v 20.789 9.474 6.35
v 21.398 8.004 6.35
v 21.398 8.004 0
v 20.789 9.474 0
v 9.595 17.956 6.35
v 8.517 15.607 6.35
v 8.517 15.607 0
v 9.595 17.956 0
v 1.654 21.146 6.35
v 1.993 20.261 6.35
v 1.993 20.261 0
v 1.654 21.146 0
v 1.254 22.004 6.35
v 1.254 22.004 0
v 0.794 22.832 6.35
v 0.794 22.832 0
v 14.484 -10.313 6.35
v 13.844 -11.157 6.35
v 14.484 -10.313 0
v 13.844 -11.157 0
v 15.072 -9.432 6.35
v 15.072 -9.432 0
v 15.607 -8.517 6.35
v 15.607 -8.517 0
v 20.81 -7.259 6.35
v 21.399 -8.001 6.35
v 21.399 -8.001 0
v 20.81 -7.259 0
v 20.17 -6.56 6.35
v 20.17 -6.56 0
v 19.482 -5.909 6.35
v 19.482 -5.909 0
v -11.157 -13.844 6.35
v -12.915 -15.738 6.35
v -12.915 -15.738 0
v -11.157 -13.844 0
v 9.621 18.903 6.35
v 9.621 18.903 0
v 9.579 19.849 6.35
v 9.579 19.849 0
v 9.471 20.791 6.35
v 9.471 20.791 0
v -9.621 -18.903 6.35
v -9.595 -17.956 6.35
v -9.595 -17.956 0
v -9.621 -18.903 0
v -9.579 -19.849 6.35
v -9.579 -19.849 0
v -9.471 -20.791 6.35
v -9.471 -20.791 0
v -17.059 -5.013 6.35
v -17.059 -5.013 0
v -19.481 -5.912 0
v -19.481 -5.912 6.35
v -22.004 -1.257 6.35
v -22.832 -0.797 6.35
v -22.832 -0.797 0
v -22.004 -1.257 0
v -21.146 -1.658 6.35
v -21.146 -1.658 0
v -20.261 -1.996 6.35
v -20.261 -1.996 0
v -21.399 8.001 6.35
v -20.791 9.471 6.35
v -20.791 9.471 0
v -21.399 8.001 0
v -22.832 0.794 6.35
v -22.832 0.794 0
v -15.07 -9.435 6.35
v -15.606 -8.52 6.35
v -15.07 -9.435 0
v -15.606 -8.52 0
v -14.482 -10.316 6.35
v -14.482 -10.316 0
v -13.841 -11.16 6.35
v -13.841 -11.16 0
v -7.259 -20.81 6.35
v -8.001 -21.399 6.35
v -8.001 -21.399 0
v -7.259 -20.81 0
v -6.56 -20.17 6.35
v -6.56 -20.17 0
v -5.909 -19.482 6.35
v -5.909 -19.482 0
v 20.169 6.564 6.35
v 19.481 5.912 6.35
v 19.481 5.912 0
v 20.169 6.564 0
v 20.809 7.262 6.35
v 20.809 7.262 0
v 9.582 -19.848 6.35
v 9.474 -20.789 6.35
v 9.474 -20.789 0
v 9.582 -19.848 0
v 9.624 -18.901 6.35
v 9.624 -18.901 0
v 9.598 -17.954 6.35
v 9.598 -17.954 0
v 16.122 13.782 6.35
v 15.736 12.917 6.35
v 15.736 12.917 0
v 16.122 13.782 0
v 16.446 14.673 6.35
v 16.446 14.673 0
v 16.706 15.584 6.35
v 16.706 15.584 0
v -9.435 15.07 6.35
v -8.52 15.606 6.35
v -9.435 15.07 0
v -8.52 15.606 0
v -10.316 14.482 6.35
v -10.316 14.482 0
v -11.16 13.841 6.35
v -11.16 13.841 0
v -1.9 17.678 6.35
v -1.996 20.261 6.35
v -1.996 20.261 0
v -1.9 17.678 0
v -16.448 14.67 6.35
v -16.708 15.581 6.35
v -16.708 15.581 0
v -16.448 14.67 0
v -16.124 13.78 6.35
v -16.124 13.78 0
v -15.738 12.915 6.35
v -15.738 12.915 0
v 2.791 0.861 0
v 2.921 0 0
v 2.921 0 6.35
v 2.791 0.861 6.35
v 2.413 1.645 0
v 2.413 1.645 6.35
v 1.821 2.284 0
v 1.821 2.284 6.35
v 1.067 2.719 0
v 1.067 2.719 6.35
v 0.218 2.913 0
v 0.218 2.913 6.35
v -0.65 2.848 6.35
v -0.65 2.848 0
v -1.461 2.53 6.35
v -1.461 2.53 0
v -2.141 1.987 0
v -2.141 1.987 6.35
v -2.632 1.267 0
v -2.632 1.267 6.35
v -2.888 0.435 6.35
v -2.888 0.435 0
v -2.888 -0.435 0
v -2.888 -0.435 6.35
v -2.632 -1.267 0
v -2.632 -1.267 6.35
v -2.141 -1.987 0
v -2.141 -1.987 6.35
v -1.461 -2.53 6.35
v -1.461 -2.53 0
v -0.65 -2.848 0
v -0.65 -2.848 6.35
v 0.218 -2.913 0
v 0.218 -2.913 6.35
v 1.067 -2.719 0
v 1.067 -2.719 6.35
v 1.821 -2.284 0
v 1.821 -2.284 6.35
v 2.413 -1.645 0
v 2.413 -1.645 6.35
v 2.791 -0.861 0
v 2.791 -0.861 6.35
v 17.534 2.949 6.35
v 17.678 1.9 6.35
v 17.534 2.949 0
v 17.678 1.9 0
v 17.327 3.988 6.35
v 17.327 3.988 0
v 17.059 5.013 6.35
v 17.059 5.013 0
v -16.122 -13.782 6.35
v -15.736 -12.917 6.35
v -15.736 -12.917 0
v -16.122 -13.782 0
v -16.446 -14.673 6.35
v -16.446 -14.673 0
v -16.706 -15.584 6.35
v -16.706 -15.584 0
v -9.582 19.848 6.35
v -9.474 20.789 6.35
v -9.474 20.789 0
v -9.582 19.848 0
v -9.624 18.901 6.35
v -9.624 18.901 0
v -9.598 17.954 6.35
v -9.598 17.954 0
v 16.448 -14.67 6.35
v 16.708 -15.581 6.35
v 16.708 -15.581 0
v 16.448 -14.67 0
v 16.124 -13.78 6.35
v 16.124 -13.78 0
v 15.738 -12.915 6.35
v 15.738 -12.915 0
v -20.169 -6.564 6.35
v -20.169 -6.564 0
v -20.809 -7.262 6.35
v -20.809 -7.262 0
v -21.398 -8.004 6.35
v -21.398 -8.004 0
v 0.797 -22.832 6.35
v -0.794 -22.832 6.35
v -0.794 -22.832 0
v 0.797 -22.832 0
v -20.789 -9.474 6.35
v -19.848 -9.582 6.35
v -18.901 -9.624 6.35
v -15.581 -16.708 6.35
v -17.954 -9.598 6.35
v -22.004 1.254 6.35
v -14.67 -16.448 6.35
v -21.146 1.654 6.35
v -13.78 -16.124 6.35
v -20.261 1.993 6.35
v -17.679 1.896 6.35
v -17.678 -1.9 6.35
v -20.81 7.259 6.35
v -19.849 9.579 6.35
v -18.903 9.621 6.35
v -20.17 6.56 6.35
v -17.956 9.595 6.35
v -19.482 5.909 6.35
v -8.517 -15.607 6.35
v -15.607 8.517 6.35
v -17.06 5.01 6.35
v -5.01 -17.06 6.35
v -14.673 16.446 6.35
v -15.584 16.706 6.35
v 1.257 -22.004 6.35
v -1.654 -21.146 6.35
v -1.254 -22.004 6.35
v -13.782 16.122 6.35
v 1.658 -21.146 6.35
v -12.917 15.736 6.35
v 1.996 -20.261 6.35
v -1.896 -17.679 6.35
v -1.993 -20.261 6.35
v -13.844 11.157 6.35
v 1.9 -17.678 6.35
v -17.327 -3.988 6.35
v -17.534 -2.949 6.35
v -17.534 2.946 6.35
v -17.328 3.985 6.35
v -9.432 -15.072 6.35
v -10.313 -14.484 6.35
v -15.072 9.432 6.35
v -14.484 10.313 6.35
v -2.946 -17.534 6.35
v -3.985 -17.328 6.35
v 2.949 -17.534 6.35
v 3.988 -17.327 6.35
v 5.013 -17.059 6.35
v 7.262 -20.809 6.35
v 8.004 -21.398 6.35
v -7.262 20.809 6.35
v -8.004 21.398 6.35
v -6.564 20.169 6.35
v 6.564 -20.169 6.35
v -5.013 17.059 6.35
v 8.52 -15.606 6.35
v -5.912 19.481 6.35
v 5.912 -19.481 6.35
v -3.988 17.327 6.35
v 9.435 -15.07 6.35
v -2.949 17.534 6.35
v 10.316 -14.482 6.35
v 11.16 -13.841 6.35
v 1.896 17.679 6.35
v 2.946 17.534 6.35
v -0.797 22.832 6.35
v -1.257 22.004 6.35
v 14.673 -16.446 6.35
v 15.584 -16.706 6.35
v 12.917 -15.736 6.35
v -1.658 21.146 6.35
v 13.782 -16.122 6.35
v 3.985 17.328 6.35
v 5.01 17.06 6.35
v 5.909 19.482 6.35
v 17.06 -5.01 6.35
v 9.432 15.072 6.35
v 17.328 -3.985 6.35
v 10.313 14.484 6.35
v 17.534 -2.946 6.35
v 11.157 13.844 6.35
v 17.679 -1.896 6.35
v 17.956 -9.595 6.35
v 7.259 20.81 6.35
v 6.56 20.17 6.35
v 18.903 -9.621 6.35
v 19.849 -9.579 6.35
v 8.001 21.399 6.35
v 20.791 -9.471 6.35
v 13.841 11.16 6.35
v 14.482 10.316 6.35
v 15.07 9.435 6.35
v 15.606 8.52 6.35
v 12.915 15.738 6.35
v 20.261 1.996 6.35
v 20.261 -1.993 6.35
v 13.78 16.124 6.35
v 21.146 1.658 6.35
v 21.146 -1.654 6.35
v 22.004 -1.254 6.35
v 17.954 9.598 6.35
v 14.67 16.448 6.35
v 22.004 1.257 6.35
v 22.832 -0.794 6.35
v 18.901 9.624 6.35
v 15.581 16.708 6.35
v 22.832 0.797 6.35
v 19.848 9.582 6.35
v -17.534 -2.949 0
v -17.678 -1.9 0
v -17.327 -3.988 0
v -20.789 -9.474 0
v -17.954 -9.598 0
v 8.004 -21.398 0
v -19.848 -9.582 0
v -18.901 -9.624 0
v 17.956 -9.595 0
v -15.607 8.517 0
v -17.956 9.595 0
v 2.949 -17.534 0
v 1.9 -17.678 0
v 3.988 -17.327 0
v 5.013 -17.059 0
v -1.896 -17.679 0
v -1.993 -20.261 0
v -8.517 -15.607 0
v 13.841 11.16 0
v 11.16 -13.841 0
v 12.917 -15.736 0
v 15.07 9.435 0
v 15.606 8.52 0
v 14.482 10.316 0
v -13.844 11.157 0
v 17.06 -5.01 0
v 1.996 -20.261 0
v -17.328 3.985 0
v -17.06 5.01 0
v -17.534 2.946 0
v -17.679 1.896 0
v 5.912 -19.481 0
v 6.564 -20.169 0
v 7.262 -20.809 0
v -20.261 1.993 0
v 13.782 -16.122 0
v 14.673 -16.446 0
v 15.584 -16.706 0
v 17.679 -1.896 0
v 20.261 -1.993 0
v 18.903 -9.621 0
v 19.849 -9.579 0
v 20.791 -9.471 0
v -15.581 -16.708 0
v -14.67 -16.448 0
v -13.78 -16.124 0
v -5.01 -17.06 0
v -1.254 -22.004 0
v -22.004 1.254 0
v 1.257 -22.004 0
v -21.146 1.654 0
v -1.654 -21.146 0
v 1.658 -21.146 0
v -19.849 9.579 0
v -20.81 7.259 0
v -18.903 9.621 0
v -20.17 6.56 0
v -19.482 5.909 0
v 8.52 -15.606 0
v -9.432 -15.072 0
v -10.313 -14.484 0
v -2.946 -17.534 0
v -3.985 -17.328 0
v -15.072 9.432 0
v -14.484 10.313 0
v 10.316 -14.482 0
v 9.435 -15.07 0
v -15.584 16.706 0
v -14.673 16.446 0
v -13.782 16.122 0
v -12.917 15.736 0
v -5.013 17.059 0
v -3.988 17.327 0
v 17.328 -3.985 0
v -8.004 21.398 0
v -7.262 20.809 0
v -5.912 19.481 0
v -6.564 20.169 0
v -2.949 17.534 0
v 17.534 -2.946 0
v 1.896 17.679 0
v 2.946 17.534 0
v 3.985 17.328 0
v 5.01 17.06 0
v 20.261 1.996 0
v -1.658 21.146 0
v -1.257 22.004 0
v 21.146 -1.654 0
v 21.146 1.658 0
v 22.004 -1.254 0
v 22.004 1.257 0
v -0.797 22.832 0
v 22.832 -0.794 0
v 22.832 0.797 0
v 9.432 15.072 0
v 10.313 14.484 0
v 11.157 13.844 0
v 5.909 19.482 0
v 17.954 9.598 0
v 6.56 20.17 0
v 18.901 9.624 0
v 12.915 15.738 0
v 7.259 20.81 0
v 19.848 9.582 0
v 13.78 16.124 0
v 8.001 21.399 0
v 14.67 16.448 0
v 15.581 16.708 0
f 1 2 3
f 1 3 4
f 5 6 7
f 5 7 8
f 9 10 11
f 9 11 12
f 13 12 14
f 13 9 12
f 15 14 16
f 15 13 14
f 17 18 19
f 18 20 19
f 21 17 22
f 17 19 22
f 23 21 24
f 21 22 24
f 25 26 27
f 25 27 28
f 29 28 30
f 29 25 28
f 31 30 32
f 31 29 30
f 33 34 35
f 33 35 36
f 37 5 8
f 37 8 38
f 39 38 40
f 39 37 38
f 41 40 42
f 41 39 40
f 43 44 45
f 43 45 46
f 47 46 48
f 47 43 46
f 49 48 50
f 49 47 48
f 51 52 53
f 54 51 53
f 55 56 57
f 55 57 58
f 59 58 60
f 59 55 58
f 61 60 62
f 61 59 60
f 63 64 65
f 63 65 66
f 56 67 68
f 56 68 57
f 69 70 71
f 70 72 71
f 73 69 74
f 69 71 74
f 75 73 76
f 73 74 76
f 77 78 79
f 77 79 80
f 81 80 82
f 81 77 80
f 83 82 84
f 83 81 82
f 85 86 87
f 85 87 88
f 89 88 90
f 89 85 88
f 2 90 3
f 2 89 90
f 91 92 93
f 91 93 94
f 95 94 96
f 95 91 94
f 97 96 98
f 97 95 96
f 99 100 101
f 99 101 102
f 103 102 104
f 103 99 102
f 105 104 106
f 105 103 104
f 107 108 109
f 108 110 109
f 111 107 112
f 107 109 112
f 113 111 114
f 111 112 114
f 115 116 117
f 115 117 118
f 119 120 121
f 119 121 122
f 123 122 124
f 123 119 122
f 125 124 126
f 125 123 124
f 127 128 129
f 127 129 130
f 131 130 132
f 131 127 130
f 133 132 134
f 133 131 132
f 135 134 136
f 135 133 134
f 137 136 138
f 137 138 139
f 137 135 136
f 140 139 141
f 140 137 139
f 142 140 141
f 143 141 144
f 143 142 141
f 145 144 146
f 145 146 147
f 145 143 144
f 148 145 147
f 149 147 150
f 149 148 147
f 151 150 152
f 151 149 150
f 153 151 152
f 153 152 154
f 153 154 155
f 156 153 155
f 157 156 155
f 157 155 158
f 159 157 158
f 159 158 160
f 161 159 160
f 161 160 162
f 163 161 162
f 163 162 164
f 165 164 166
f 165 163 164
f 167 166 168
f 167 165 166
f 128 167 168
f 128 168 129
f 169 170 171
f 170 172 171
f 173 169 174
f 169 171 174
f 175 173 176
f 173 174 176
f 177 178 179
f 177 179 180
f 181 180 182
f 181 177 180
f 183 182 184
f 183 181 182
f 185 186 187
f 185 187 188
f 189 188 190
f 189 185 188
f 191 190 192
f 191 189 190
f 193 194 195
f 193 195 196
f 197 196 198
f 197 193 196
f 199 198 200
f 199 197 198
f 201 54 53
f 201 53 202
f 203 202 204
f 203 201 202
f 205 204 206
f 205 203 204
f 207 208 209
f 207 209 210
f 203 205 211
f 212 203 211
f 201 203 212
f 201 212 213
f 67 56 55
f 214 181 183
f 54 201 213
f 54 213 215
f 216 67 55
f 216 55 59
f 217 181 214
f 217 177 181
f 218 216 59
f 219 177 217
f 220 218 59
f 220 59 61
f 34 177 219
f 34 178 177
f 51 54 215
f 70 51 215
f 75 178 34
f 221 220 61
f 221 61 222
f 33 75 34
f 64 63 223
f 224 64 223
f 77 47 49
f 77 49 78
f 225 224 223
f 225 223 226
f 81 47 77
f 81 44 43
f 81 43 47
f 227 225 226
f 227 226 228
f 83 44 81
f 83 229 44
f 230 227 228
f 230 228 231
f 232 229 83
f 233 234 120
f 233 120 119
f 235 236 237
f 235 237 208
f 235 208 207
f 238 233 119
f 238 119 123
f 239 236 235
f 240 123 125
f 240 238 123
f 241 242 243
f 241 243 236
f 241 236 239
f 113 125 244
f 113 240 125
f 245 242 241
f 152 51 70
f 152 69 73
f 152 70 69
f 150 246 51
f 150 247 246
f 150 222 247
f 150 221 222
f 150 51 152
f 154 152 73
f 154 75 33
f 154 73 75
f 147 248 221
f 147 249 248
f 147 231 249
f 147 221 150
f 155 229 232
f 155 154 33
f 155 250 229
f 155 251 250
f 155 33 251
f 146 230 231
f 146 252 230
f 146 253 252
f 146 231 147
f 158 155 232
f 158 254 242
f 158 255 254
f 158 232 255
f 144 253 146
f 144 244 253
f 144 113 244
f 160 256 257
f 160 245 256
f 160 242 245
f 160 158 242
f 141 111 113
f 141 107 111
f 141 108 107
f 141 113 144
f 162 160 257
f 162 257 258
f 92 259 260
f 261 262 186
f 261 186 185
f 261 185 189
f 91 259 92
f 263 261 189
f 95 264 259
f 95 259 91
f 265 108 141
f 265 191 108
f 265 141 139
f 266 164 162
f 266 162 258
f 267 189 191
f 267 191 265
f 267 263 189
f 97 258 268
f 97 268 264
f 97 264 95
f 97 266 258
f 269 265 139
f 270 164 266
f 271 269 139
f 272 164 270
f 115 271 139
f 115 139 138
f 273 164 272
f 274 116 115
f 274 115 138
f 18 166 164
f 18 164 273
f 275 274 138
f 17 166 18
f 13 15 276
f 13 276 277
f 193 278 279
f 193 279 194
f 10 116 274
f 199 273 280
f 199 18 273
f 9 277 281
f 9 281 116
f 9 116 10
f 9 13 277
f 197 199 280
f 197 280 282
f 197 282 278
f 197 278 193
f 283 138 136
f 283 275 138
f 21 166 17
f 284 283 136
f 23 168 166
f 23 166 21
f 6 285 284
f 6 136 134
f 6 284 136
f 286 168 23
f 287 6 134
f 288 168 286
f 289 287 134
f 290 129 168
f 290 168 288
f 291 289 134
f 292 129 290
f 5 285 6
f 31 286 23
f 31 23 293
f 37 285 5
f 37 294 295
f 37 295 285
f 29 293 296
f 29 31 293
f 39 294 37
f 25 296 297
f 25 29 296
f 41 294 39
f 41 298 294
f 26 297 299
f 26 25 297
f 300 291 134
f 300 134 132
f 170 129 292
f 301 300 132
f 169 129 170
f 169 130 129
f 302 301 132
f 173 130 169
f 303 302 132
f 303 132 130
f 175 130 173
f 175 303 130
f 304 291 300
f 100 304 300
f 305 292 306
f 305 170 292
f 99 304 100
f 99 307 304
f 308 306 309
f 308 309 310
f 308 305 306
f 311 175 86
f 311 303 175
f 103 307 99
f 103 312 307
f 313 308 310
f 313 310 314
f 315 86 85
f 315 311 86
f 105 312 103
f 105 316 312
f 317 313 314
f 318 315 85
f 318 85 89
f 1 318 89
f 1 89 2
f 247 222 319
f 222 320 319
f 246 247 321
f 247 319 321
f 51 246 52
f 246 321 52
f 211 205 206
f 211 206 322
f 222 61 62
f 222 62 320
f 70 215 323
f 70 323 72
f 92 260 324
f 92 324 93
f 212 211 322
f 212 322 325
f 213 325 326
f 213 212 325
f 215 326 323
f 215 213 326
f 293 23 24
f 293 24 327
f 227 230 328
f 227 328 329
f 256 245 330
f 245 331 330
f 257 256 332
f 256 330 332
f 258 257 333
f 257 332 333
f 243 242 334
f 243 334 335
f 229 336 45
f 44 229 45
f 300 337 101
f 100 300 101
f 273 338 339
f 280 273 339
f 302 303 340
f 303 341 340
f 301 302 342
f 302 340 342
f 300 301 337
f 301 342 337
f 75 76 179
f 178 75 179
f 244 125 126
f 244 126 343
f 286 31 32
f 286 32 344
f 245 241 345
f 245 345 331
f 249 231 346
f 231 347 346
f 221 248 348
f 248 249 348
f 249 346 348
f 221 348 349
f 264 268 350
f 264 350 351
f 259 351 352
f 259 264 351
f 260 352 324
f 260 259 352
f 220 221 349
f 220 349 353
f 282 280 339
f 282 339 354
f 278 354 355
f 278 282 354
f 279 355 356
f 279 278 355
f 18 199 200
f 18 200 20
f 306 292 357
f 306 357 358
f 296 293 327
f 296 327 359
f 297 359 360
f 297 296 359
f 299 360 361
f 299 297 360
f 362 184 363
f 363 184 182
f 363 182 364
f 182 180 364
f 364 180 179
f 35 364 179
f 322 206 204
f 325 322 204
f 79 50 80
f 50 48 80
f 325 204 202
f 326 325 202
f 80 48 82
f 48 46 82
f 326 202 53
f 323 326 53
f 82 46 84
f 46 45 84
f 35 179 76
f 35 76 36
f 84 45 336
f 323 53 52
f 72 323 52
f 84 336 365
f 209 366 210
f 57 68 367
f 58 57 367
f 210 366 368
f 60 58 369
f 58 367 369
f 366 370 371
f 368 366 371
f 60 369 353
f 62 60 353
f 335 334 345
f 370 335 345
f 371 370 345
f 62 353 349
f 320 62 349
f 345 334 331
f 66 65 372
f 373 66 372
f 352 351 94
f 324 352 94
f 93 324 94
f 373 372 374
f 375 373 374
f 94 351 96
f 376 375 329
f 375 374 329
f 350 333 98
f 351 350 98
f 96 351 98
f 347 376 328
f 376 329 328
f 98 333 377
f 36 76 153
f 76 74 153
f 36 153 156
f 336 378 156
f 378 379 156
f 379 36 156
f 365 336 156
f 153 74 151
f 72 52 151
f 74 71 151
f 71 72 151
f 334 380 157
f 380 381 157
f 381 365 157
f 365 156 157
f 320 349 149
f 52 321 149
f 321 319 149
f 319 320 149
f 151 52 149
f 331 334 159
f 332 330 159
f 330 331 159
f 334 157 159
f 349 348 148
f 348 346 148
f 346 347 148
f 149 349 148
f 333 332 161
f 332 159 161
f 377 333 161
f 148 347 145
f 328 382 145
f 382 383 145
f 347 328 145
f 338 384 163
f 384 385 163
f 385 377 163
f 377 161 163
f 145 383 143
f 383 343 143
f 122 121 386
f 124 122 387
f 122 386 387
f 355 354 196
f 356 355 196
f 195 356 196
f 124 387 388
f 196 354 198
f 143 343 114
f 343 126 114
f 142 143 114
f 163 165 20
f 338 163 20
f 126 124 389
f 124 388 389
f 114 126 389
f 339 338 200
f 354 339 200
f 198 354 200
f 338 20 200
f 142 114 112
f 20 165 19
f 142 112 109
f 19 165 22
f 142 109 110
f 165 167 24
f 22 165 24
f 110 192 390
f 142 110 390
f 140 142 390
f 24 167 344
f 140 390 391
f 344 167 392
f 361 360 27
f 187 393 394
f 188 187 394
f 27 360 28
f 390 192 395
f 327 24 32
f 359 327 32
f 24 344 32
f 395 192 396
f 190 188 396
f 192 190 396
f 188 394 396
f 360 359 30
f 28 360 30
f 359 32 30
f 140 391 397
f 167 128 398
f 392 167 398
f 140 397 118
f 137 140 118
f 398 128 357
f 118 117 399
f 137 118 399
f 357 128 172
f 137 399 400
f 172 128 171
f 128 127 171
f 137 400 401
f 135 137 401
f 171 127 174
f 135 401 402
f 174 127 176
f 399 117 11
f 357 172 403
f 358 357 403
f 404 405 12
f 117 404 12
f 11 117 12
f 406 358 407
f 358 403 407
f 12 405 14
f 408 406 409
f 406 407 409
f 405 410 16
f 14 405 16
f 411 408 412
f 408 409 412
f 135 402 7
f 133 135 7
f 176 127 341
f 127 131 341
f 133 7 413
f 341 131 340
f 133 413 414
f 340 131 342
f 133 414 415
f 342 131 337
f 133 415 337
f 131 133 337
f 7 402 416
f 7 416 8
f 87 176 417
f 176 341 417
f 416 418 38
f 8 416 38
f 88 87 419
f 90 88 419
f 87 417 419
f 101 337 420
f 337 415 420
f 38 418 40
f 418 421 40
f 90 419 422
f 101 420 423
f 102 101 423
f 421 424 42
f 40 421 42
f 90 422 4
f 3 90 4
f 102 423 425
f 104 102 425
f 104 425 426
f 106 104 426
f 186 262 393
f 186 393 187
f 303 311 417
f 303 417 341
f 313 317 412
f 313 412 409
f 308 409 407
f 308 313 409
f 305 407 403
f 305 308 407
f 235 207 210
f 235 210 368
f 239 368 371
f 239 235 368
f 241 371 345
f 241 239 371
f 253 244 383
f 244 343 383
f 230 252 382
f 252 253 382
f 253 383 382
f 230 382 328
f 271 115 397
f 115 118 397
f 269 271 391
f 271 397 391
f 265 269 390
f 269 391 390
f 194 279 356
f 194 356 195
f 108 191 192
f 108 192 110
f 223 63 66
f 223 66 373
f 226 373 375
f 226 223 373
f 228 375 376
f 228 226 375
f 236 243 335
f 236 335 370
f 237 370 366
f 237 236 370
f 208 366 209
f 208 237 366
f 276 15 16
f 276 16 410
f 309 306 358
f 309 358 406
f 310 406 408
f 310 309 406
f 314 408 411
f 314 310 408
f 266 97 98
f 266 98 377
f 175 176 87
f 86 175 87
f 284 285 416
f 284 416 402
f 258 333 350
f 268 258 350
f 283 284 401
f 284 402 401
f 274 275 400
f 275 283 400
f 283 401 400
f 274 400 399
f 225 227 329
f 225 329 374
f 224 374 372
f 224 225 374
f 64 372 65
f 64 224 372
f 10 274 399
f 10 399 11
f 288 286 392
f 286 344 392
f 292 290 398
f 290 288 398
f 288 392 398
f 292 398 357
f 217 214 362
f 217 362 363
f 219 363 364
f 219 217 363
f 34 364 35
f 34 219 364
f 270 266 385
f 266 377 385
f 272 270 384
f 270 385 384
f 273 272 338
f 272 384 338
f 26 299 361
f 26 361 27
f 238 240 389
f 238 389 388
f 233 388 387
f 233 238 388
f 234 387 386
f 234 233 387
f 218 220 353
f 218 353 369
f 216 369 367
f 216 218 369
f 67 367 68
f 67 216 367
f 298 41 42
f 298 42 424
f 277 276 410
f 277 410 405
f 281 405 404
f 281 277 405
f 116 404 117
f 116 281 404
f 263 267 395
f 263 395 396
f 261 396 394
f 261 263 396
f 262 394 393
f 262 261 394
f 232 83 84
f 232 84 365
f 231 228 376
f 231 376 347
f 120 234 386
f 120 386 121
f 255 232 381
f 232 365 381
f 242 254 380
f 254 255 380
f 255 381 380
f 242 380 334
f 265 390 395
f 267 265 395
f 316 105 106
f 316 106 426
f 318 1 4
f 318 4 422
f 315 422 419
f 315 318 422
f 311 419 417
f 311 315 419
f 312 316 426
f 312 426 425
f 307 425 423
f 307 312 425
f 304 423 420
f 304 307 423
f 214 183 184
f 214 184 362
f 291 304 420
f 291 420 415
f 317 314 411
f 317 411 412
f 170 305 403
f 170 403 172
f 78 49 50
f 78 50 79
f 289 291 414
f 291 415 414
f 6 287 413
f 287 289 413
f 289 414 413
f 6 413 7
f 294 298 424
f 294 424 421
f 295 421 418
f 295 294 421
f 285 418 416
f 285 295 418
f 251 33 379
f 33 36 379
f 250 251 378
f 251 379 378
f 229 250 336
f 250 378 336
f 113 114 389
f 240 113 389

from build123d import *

# Parameters (mm, degrees)
F0_R            = 17.78
F0_R_2          = 2.921
F1_DEPTH        = 6.35
F3_DEPTH        = 6.35
F3_COPIES_COUNT = 16


# Not quite as in the source:
# - a pattern or mirror of a feature is missing from the dataset's text; its kind, count and spacing are read off the source's solid


with BuildPart() as f1:
    # F0 (on Top) → F1 (new body)
    with BuildSketch(Plane.XY):
        Circle(F0_R)
        Circle(F0_R_2, mode=Mode.SUBTRACT)
    extrude(amount=F1_DEPTH)

    # F2 (on face) → F3 (join)
    with BuildSketch(Plane.XY.offset(6.35)):
        with BuildLine():
            Line((1.8639226102, 16.8154710155), (1.9928398674, 20.2606273541))
            ThreePointArc((1.9928398674, 20.2606273541), (1.461833226, 21.5784372569), (0.7936344478, 22.8322719293))
            Line((0.7936344478, 22.8322719293), (-0.0017393364, 22.8322719293))
            Line((-0.0017393364, 22.8322719293), (-0.7971131206, 22.8322719293))
            ThreePointArc((-0.7971131206, 22.8322719293), (-1.4653118988, 21.5784372569), (-1.9963185402, 20.2606273541))
            Line((-1.9963185402, 20.2606273541), (-1.8674012831, 16.8154710155))
            Line((-1.8674012831, 16.8154710155), (-0.0017393364, 16.8154710155))
            Line((-0.0017393364, 16.8154710155), (1.8639226102, 16.8154710155))
        make_face()
    f3 = extrude(amount=-F3_DEPTH)

    # F3_copies: F3 ×16 about axis
    f3_copies_axis = Axis((0, 0, 0), (0, 0, 1))
    for i in range(1, F3_COPIES_COUNT):
        add(f3.rotate(f3_copies_axis, i * 360 / F3_COPIES_COUNT))


solid = f1.part
